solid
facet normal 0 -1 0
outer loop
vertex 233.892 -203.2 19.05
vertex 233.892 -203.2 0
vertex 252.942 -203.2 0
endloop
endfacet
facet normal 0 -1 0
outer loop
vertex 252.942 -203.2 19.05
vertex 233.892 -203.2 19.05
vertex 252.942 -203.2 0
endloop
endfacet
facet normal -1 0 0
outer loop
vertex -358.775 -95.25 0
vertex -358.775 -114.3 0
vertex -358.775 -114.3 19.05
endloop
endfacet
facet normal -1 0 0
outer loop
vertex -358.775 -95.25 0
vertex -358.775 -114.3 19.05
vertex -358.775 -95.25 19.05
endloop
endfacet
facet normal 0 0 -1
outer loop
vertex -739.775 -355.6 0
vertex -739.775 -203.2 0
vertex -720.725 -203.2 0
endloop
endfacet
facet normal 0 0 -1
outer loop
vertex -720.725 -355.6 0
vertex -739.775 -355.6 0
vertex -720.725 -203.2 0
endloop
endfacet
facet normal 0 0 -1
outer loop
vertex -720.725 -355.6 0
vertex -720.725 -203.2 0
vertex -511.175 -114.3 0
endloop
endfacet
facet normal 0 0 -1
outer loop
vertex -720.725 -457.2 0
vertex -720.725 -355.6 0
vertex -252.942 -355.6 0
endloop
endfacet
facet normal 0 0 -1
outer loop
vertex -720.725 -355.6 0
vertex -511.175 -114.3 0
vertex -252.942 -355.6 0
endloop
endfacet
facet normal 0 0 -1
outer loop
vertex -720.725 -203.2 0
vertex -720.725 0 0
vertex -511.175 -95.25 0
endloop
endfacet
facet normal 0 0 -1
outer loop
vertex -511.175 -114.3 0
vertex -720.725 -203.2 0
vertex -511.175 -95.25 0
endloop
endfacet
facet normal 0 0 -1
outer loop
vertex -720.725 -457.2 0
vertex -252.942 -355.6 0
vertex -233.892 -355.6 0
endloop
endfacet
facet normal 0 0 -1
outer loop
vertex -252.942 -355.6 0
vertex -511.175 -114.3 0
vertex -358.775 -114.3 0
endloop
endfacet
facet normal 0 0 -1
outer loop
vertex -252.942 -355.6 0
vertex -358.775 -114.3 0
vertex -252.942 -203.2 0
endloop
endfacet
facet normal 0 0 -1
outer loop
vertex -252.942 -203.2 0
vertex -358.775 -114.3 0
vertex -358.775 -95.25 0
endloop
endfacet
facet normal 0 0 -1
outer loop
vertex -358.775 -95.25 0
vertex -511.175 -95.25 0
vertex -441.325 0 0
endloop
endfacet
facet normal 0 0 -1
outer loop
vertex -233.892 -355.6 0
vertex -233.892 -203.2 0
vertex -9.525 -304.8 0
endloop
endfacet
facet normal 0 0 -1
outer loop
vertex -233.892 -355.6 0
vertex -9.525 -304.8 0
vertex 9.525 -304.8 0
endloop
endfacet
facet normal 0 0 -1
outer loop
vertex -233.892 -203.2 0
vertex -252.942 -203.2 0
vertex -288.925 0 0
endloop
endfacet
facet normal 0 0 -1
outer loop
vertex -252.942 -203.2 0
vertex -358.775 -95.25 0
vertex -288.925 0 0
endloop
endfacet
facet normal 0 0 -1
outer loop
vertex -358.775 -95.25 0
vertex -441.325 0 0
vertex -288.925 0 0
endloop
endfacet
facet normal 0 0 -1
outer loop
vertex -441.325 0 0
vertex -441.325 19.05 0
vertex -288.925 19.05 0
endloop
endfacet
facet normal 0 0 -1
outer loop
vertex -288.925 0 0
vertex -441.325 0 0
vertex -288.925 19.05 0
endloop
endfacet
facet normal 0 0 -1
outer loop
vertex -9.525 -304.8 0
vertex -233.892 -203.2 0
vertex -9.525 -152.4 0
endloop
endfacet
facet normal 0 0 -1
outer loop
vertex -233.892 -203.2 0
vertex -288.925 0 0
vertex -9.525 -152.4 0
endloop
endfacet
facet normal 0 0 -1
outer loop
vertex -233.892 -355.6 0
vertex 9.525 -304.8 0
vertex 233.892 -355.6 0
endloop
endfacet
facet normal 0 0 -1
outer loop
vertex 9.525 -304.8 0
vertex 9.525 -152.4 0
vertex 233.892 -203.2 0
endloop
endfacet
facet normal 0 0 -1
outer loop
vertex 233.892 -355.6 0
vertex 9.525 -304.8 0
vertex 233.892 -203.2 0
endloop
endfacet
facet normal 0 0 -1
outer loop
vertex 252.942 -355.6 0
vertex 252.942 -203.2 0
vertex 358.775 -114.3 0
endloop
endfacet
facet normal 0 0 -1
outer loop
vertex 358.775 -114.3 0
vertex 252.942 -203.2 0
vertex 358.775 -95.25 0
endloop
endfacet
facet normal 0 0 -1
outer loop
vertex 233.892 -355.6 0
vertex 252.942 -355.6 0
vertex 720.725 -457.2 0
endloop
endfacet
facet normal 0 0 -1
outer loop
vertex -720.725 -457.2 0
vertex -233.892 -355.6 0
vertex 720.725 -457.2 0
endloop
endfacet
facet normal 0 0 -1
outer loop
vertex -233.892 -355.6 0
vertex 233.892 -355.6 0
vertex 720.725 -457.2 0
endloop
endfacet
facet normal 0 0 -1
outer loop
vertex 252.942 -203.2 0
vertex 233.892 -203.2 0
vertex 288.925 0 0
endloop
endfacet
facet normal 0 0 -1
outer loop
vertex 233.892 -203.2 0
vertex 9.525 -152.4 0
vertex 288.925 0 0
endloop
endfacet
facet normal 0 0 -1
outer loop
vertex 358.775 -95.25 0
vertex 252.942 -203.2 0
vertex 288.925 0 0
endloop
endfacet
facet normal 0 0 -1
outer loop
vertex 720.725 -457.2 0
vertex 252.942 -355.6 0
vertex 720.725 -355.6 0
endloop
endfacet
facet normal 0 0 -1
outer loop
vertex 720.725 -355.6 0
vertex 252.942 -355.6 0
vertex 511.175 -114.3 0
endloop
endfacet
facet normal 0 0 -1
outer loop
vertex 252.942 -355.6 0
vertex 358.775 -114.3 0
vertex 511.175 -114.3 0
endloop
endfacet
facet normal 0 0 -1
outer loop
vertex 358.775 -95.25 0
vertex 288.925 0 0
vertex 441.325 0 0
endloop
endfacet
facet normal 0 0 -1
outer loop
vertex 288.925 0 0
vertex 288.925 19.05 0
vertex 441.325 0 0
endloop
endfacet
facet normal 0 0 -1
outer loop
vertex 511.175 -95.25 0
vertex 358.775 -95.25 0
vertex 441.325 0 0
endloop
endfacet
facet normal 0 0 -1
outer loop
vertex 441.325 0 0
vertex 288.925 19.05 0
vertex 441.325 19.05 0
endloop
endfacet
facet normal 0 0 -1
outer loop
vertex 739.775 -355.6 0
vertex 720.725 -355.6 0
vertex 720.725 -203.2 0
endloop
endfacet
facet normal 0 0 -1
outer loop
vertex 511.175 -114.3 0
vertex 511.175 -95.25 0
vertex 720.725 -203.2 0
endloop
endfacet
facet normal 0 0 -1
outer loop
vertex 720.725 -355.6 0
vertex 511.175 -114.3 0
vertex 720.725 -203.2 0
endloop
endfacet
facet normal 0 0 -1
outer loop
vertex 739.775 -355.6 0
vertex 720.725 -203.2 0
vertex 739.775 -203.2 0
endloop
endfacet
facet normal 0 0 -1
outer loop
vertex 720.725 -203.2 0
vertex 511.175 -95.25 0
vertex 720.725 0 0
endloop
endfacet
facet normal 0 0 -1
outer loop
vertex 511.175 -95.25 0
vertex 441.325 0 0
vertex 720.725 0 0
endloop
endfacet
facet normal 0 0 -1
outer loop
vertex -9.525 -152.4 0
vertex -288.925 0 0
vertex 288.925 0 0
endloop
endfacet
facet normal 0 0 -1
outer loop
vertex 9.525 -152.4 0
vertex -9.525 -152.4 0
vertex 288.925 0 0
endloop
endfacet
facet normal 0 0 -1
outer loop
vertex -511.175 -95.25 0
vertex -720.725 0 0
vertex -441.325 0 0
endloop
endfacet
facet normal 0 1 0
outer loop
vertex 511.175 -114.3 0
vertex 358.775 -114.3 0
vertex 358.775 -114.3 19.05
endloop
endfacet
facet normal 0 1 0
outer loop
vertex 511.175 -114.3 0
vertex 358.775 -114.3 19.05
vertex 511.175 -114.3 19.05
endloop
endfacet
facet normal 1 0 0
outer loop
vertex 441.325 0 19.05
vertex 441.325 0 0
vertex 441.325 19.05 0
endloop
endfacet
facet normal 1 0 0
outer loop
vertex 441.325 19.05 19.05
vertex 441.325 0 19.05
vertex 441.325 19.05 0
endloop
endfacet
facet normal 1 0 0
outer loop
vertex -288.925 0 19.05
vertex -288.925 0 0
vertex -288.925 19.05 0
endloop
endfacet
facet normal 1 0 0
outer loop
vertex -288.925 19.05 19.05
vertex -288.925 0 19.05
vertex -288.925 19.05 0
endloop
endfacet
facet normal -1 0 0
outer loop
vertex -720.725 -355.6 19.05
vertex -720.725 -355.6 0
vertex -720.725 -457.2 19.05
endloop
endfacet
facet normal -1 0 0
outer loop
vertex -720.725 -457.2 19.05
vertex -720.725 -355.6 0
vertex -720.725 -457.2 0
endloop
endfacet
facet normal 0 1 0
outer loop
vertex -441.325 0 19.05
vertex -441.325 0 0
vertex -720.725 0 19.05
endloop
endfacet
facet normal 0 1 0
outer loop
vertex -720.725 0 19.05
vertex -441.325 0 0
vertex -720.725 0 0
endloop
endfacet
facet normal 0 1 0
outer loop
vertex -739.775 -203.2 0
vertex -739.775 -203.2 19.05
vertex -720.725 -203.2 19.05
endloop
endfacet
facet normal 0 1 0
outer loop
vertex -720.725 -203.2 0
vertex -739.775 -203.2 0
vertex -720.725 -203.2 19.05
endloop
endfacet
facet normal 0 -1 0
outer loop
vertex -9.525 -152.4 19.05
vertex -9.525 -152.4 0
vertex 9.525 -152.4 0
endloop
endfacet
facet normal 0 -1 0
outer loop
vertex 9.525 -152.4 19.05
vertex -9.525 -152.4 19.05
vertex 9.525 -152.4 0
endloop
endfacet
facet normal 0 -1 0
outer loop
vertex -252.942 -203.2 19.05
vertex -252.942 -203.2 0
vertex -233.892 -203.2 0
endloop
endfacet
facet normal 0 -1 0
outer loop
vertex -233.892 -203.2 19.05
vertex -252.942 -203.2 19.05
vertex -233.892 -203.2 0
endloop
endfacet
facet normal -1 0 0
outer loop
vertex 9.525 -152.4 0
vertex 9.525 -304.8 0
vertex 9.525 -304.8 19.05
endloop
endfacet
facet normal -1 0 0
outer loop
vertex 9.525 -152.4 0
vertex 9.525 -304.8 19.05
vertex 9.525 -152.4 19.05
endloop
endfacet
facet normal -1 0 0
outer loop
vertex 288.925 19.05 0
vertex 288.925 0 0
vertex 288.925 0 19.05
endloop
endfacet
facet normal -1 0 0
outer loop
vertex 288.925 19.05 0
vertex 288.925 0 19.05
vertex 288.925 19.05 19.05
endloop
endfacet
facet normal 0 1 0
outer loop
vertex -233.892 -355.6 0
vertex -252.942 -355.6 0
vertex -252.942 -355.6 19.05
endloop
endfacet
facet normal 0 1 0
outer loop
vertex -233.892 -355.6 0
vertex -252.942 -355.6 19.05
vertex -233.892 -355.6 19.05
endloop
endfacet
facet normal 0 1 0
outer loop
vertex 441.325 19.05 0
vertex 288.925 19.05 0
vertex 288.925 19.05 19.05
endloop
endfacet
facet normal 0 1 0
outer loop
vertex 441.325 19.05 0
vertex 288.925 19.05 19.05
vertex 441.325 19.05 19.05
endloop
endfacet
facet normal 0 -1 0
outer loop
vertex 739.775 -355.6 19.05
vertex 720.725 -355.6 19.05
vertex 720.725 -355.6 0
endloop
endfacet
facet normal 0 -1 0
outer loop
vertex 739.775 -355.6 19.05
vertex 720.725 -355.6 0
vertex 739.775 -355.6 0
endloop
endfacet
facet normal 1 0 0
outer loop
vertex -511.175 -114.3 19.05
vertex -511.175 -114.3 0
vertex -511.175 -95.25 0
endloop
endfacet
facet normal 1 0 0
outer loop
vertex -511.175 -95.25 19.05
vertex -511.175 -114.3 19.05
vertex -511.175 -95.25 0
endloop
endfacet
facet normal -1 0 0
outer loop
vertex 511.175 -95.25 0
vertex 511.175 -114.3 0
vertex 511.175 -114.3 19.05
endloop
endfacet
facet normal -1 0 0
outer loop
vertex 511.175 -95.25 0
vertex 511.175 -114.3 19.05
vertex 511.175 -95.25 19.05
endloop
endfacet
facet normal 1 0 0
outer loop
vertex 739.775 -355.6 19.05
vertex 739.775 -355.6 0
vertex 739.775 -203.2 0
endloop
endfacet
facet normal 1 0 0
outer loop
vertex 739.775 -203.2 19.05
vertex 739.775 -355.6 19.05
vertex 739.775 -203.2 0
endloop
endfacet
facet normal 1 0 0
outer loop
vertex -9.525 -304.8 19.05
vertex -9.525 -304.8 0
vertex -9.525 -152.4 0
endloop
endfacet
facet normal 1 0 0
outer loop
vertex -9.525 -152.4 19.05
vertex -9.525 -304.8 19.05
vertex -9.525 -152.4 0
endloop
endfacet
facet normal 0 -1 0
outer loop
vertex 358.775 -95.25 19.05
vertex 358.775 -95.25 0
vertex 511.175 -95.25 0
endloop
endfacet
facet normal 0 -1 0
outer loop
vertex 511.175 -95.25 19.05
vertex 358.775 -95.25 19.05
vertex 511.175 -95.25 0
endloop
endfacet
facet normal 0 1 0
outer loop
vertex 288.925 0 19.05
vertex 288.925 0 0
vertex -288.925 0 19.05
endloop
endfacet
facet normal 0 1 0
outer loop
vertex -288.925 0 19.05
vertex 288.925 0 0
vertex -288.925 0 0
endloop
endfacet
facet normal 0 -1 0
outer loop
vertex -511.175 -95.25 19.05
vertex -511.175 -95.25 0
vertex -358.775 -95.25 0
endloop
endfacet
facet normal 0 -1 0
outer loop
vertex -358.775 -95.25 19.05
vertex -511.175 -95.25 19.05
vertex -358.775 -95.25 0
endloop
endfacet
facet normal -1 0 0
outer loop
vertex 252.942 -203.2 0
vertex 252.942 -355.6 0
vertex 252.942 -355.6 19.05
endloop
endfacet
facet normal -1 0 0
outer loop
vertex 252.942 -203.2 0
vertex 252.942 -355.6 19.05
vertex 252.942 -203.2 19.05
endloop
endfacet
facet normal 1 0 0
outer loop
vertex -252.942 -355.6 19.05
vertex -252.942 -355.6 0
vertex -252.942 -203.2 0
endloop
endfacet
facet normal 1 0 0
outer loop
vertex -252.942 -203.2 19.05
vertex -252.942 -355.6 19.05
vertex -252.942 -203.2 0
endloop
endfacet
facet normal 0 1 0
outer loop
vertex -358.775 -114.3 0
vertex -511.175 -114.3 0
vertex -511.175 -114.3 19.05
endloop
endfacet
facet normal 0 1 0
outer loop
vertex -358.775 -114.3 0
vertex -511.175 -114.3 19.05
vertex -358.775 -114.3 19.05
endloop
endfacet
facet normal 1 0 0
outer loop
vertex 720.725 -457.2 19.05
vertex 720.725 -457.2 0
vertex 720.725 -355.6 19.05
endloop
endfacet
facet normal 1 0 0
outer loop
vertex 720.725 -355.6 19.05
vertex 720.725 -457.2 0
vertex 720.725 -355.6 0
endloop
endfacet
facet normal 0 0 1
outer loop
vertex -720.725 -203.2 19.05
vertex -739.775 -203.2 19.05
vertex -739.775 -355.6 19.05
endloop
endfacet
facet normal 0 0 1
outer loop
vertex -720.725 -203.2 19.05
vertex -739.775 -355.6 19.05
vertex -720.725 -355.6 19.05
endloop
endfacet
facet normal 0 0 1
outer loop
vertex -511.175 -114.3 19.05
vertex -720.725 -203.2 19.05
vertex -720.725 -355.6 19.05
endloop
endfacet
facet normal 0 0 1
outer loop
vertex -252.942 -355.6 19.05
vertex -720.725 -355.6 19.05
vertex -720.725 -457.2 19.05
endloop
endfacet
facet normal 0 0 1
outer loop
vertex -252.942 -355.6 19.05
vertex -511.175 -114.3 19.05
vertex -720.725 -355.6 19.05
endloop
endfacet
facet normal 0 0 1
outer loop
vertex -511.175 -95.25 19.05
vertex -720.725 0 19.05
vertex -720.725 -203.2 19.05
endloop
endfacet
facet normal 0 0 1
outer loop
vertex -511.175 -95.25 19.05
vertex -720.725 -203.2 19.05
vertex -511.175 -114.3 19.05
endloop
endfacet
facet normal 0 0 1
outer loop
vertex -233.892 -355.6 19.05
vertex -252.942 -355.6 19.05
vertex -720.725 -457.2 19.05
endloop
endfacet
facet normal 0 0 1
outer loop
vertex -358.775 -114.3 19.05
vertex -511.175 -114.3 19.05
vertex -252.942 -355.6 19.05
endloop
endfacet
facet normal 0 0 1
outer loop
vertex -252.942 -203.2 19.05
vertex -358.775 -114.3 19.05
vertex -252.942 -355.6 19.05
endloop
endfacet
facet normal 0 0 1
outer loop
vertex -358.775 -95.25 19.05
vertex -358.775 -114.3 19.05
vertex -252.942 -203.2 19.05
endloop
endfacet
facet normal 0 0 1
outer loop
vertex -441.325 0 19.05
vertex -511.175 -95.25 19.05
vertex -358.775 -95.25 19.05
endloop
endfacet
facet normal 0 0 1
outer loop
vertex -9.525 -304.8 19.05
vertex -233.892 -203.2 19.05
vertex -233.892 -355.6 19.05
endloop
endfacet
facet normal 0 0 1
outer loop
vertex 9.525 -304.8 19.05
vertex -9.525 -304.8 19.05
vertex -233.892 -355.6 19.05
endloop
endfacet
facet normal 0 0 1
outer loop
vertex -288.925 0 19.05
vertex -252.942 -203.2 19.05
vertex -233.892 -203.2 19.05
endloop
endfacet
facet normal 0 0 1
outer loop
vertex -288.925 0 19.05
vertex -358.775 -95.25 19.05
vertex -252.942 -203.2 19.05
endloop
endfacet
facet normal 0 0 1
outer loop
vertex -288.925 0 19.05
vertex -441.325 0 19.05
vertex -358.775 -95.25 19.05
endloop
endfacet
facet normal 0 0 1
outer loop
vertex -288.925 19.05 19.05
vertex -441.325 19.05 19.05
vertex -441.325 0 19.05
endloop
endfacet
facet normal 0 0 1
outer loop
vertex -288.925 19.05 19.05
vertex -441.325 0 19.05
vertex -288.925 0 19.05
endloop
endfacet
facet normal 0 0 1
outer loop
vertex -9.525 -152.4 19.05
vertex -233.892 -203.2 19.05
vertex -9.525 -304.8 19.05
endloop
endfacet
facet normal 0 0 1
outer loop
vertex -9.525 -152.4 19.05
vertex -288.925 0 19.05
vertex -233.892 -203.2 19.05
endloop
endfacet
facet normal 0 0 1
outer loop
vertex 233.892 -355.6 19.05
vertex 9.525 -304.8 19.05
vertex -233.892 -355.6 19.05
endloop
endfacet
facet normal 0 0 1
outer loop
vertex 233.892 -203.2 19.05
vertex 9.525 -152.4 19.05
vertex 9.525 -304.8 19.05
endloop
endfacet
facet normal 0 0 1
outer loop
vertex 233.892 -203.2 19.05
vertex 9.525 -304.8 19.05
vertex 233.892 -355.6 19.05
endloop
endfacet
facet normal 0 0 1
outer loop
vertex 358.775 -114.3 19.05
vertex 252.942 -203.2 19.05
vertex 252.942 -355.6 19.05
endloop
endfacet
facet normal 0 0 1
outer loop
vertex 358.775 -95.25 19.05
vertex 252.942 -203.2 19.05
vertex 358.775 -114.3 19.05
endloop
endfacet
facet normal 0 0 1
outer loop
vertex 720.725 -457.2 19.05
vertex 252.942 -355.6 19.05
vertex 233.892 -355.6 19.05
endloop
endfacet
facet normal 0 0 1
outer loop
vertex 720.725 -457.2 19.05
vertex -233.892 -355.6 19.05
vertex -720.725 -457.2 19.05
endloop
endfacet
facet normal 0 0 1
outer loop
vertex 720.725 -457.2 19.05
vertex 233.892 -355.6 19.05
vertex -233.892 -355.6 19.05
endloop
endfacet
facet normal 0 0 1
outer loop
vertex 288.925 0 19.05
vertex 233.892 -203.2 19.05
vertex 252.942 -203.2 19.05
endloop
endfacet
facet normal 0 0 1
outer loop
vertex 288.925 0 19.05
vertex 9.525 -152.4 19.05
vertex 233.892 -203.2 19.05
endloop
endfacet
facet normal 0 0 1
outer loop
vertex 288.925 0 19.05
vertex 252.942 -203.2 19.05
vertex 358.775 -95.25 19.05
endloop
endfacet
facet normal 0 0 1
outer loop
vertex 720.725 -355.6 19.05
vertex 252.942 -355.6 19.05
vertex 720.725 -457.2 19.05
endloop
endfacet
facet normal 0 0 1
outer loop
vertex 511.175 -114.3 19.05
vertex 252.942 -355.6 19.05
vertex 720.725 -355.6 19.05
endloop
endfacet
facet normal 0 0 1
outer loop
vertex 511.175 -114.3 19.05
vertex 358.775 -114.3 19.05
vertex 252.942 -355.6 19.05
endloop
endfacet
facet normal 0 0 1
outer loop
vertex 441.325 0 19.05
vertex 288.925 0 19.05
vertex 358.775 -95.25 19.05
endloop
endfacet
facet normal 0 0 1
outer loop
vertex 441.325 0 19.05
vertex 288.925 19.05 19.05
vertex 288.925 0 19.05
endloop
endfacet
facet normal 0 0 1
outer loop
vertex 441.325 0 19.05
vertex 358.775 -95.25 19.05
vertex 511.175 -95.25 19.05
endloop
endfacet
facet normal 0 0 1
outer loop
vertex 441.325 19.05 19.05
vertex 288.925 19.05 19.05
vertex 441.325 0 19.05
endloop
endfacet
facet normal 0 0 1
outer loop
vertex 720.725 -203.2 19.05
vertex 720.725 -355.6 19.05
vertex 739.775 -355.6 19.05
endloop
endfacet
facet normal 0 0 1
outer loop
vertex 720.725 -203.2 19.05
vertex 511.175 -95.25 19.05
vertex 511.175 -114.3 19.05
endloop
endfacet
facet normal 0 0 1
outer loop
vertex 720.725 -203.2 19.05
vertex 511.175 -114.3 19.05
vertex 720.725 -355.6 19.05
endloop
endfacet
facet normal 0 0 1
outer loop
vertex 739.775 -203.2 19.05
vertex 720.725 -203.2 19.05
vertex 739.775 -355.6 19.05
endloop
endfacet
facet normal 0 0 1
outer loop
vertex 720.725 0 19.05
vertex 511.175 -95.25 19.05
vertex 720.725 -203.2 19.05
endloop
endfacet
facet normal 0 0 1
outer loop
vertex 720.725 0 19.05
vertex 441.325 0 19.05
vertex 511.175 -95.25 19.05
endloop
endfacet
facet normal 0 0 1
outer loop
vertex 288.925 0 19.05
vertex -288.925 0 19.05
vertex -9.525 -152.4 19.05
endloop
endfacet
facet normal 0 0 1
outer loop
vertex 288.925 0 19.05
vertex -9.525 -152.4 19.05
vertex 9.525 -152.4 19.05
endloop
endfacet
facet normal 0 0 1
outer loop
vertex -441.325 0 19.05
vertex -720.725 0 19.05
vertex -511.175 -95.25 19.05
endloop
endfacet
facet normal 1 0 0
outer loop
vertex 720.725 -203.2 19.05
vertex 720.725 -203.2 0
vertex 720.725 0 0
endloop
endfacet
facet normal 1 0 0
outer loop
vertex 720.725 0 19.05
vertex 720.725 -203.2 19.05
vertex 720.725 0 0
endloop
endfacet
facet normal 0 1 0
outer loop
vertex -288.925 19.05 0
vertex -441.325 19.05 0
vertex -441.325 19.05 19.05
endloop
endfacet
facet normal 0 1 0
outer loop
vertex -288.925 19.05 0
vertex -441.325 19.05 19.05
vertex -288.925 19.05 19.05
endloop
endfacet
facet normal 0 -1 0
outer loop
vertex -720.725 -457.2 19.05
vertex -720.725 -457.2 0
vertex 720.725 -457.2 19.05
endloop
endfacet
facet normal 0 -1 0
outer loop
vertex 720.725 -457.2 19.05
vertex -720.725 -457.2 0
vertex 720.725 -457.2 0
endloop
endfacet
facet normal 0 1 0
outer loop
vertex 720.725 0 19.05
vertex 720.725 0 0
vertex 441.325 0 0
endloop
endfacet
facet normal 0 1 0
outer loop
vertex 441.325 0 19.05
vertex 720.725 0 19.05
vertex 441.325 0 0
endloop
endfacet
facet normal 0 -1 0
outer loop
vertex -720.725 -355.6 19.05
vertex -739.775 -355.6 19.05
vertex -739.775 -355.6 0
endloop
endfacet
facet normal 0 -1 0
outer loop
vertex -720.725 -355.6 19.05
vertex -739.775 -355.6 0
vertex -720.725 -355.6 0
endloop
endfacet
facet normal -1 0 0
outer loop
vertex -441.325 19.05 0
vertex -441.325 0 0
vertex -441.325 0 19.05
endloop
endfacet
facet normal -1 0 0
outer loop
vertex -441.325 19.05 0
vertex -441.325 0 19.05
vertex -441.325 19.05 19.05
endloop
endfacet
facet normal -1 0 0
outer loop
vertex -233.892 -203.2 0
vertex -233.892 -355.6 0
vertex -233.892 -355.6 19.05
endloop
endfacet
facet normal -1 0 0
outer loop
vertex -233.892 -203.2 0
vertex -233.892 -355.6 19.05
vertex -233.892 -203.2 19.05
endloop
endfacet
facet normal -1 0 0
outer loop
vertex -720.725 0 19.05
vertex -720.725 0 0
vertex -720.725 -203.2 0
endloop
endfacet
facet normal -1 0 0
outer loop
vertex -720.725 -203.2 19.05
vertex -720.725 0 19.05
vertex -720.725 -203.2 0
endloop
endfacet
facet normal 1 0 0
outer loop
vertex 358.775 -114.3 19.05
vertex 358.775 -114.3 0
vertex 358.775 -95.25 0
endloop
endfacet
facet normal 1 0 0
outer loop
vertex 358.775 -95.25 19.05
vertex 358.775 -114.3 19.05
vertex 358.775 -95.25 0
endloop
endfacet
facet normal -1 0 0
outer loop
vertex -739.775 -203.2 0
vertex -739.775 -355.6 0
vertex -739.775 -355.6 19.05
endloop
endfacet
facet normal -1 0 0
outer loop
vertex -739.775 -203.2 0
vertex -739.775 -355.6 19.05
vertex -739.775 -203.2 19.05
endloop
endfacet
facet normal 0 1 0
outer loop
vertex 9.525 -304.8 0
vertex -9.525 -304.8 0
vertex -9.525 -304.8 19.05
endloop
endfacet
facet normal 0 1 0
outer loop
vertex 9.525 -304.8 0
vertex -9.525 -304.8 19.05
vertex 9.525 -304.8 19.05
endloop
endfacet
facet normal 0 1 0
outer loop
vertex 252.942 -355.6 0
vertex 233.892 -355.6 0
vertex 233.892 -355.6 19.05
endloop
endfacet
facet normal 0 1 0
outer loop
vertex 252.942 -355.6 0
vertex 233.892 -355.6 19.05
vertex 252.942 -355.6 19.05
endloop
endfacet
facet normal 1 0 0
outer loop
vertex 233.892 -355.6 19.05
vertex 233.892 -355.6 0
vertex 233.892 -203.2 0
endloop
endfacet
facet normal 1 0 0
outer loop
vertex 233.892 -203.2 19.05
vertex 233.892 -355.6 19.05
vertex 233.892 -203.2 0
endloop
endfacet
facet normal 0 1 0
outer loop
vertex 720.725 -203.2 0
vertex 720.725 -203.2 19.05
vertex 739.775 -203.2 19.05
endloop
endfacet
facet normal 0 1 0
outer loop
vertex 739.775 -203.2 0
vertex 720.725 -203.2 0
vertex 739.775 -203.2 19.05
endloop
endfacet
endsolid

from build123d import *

# Parameters (mm, degrees)
F0_W     = 19.05
F0_H     = 152.4
F0_W_2   = 152.4
F0_H_2   = 19.05
F1_DEPTH = 19.05


with BuildPart() as f1:
    # F0 (on Top) → F1 (new body)
    with BuildSketch(Plane.XY):
        Polygon((-441.325, 0), (-720.725, 0), (-720.725, -203.2), (-720.725, -355.6), (-720.725, -457.2), (720.725, -457.2), (720.725, -355.6), (720.725, -203.2), (720.725, 0), (441.325, 0), (288.925, 0), (-288.925, 0), align=None)
        with Locations((-243.416667, -279.4)):
            Rectangle(F0_W, F0_H, mode=Mode.SUBTRACT)
        with Locations((243.416667, -279.4)):
            Rectangle(F0_W, F0_H, mode=Mode.SUBTRACT)
        with Locations((0, -228.6)):
            Rectangle(F0_W, F0_H, mode=Mode.SUBTRACT)
        with Locations((-434.975, -104.775)):
            Rectangle(F0_W_2, F0_H_2, mode=Mode.SUBTRACT)
        with Locations((434.975, -104.775)):
            Rectangle(F0_W_2, F0_H_2, mode=Mode.SUBTRACT)
        with Locations((-365.125, 9.525)):
            Rectangle(F0_W_2, F0_H_2)
        with Locations((365.125, 9.525)):
            Rectangle(F0_W_2, F0_H_2)
        with Locations((730.25, -279.4)):
            Rectangle(F0_W, F0_H)
        with Locations((-730.25, -279.4)):
            Rectangle(F0_W, F0_H)
    extrude(amount=F1_DEPTH)


solid = f1.part
